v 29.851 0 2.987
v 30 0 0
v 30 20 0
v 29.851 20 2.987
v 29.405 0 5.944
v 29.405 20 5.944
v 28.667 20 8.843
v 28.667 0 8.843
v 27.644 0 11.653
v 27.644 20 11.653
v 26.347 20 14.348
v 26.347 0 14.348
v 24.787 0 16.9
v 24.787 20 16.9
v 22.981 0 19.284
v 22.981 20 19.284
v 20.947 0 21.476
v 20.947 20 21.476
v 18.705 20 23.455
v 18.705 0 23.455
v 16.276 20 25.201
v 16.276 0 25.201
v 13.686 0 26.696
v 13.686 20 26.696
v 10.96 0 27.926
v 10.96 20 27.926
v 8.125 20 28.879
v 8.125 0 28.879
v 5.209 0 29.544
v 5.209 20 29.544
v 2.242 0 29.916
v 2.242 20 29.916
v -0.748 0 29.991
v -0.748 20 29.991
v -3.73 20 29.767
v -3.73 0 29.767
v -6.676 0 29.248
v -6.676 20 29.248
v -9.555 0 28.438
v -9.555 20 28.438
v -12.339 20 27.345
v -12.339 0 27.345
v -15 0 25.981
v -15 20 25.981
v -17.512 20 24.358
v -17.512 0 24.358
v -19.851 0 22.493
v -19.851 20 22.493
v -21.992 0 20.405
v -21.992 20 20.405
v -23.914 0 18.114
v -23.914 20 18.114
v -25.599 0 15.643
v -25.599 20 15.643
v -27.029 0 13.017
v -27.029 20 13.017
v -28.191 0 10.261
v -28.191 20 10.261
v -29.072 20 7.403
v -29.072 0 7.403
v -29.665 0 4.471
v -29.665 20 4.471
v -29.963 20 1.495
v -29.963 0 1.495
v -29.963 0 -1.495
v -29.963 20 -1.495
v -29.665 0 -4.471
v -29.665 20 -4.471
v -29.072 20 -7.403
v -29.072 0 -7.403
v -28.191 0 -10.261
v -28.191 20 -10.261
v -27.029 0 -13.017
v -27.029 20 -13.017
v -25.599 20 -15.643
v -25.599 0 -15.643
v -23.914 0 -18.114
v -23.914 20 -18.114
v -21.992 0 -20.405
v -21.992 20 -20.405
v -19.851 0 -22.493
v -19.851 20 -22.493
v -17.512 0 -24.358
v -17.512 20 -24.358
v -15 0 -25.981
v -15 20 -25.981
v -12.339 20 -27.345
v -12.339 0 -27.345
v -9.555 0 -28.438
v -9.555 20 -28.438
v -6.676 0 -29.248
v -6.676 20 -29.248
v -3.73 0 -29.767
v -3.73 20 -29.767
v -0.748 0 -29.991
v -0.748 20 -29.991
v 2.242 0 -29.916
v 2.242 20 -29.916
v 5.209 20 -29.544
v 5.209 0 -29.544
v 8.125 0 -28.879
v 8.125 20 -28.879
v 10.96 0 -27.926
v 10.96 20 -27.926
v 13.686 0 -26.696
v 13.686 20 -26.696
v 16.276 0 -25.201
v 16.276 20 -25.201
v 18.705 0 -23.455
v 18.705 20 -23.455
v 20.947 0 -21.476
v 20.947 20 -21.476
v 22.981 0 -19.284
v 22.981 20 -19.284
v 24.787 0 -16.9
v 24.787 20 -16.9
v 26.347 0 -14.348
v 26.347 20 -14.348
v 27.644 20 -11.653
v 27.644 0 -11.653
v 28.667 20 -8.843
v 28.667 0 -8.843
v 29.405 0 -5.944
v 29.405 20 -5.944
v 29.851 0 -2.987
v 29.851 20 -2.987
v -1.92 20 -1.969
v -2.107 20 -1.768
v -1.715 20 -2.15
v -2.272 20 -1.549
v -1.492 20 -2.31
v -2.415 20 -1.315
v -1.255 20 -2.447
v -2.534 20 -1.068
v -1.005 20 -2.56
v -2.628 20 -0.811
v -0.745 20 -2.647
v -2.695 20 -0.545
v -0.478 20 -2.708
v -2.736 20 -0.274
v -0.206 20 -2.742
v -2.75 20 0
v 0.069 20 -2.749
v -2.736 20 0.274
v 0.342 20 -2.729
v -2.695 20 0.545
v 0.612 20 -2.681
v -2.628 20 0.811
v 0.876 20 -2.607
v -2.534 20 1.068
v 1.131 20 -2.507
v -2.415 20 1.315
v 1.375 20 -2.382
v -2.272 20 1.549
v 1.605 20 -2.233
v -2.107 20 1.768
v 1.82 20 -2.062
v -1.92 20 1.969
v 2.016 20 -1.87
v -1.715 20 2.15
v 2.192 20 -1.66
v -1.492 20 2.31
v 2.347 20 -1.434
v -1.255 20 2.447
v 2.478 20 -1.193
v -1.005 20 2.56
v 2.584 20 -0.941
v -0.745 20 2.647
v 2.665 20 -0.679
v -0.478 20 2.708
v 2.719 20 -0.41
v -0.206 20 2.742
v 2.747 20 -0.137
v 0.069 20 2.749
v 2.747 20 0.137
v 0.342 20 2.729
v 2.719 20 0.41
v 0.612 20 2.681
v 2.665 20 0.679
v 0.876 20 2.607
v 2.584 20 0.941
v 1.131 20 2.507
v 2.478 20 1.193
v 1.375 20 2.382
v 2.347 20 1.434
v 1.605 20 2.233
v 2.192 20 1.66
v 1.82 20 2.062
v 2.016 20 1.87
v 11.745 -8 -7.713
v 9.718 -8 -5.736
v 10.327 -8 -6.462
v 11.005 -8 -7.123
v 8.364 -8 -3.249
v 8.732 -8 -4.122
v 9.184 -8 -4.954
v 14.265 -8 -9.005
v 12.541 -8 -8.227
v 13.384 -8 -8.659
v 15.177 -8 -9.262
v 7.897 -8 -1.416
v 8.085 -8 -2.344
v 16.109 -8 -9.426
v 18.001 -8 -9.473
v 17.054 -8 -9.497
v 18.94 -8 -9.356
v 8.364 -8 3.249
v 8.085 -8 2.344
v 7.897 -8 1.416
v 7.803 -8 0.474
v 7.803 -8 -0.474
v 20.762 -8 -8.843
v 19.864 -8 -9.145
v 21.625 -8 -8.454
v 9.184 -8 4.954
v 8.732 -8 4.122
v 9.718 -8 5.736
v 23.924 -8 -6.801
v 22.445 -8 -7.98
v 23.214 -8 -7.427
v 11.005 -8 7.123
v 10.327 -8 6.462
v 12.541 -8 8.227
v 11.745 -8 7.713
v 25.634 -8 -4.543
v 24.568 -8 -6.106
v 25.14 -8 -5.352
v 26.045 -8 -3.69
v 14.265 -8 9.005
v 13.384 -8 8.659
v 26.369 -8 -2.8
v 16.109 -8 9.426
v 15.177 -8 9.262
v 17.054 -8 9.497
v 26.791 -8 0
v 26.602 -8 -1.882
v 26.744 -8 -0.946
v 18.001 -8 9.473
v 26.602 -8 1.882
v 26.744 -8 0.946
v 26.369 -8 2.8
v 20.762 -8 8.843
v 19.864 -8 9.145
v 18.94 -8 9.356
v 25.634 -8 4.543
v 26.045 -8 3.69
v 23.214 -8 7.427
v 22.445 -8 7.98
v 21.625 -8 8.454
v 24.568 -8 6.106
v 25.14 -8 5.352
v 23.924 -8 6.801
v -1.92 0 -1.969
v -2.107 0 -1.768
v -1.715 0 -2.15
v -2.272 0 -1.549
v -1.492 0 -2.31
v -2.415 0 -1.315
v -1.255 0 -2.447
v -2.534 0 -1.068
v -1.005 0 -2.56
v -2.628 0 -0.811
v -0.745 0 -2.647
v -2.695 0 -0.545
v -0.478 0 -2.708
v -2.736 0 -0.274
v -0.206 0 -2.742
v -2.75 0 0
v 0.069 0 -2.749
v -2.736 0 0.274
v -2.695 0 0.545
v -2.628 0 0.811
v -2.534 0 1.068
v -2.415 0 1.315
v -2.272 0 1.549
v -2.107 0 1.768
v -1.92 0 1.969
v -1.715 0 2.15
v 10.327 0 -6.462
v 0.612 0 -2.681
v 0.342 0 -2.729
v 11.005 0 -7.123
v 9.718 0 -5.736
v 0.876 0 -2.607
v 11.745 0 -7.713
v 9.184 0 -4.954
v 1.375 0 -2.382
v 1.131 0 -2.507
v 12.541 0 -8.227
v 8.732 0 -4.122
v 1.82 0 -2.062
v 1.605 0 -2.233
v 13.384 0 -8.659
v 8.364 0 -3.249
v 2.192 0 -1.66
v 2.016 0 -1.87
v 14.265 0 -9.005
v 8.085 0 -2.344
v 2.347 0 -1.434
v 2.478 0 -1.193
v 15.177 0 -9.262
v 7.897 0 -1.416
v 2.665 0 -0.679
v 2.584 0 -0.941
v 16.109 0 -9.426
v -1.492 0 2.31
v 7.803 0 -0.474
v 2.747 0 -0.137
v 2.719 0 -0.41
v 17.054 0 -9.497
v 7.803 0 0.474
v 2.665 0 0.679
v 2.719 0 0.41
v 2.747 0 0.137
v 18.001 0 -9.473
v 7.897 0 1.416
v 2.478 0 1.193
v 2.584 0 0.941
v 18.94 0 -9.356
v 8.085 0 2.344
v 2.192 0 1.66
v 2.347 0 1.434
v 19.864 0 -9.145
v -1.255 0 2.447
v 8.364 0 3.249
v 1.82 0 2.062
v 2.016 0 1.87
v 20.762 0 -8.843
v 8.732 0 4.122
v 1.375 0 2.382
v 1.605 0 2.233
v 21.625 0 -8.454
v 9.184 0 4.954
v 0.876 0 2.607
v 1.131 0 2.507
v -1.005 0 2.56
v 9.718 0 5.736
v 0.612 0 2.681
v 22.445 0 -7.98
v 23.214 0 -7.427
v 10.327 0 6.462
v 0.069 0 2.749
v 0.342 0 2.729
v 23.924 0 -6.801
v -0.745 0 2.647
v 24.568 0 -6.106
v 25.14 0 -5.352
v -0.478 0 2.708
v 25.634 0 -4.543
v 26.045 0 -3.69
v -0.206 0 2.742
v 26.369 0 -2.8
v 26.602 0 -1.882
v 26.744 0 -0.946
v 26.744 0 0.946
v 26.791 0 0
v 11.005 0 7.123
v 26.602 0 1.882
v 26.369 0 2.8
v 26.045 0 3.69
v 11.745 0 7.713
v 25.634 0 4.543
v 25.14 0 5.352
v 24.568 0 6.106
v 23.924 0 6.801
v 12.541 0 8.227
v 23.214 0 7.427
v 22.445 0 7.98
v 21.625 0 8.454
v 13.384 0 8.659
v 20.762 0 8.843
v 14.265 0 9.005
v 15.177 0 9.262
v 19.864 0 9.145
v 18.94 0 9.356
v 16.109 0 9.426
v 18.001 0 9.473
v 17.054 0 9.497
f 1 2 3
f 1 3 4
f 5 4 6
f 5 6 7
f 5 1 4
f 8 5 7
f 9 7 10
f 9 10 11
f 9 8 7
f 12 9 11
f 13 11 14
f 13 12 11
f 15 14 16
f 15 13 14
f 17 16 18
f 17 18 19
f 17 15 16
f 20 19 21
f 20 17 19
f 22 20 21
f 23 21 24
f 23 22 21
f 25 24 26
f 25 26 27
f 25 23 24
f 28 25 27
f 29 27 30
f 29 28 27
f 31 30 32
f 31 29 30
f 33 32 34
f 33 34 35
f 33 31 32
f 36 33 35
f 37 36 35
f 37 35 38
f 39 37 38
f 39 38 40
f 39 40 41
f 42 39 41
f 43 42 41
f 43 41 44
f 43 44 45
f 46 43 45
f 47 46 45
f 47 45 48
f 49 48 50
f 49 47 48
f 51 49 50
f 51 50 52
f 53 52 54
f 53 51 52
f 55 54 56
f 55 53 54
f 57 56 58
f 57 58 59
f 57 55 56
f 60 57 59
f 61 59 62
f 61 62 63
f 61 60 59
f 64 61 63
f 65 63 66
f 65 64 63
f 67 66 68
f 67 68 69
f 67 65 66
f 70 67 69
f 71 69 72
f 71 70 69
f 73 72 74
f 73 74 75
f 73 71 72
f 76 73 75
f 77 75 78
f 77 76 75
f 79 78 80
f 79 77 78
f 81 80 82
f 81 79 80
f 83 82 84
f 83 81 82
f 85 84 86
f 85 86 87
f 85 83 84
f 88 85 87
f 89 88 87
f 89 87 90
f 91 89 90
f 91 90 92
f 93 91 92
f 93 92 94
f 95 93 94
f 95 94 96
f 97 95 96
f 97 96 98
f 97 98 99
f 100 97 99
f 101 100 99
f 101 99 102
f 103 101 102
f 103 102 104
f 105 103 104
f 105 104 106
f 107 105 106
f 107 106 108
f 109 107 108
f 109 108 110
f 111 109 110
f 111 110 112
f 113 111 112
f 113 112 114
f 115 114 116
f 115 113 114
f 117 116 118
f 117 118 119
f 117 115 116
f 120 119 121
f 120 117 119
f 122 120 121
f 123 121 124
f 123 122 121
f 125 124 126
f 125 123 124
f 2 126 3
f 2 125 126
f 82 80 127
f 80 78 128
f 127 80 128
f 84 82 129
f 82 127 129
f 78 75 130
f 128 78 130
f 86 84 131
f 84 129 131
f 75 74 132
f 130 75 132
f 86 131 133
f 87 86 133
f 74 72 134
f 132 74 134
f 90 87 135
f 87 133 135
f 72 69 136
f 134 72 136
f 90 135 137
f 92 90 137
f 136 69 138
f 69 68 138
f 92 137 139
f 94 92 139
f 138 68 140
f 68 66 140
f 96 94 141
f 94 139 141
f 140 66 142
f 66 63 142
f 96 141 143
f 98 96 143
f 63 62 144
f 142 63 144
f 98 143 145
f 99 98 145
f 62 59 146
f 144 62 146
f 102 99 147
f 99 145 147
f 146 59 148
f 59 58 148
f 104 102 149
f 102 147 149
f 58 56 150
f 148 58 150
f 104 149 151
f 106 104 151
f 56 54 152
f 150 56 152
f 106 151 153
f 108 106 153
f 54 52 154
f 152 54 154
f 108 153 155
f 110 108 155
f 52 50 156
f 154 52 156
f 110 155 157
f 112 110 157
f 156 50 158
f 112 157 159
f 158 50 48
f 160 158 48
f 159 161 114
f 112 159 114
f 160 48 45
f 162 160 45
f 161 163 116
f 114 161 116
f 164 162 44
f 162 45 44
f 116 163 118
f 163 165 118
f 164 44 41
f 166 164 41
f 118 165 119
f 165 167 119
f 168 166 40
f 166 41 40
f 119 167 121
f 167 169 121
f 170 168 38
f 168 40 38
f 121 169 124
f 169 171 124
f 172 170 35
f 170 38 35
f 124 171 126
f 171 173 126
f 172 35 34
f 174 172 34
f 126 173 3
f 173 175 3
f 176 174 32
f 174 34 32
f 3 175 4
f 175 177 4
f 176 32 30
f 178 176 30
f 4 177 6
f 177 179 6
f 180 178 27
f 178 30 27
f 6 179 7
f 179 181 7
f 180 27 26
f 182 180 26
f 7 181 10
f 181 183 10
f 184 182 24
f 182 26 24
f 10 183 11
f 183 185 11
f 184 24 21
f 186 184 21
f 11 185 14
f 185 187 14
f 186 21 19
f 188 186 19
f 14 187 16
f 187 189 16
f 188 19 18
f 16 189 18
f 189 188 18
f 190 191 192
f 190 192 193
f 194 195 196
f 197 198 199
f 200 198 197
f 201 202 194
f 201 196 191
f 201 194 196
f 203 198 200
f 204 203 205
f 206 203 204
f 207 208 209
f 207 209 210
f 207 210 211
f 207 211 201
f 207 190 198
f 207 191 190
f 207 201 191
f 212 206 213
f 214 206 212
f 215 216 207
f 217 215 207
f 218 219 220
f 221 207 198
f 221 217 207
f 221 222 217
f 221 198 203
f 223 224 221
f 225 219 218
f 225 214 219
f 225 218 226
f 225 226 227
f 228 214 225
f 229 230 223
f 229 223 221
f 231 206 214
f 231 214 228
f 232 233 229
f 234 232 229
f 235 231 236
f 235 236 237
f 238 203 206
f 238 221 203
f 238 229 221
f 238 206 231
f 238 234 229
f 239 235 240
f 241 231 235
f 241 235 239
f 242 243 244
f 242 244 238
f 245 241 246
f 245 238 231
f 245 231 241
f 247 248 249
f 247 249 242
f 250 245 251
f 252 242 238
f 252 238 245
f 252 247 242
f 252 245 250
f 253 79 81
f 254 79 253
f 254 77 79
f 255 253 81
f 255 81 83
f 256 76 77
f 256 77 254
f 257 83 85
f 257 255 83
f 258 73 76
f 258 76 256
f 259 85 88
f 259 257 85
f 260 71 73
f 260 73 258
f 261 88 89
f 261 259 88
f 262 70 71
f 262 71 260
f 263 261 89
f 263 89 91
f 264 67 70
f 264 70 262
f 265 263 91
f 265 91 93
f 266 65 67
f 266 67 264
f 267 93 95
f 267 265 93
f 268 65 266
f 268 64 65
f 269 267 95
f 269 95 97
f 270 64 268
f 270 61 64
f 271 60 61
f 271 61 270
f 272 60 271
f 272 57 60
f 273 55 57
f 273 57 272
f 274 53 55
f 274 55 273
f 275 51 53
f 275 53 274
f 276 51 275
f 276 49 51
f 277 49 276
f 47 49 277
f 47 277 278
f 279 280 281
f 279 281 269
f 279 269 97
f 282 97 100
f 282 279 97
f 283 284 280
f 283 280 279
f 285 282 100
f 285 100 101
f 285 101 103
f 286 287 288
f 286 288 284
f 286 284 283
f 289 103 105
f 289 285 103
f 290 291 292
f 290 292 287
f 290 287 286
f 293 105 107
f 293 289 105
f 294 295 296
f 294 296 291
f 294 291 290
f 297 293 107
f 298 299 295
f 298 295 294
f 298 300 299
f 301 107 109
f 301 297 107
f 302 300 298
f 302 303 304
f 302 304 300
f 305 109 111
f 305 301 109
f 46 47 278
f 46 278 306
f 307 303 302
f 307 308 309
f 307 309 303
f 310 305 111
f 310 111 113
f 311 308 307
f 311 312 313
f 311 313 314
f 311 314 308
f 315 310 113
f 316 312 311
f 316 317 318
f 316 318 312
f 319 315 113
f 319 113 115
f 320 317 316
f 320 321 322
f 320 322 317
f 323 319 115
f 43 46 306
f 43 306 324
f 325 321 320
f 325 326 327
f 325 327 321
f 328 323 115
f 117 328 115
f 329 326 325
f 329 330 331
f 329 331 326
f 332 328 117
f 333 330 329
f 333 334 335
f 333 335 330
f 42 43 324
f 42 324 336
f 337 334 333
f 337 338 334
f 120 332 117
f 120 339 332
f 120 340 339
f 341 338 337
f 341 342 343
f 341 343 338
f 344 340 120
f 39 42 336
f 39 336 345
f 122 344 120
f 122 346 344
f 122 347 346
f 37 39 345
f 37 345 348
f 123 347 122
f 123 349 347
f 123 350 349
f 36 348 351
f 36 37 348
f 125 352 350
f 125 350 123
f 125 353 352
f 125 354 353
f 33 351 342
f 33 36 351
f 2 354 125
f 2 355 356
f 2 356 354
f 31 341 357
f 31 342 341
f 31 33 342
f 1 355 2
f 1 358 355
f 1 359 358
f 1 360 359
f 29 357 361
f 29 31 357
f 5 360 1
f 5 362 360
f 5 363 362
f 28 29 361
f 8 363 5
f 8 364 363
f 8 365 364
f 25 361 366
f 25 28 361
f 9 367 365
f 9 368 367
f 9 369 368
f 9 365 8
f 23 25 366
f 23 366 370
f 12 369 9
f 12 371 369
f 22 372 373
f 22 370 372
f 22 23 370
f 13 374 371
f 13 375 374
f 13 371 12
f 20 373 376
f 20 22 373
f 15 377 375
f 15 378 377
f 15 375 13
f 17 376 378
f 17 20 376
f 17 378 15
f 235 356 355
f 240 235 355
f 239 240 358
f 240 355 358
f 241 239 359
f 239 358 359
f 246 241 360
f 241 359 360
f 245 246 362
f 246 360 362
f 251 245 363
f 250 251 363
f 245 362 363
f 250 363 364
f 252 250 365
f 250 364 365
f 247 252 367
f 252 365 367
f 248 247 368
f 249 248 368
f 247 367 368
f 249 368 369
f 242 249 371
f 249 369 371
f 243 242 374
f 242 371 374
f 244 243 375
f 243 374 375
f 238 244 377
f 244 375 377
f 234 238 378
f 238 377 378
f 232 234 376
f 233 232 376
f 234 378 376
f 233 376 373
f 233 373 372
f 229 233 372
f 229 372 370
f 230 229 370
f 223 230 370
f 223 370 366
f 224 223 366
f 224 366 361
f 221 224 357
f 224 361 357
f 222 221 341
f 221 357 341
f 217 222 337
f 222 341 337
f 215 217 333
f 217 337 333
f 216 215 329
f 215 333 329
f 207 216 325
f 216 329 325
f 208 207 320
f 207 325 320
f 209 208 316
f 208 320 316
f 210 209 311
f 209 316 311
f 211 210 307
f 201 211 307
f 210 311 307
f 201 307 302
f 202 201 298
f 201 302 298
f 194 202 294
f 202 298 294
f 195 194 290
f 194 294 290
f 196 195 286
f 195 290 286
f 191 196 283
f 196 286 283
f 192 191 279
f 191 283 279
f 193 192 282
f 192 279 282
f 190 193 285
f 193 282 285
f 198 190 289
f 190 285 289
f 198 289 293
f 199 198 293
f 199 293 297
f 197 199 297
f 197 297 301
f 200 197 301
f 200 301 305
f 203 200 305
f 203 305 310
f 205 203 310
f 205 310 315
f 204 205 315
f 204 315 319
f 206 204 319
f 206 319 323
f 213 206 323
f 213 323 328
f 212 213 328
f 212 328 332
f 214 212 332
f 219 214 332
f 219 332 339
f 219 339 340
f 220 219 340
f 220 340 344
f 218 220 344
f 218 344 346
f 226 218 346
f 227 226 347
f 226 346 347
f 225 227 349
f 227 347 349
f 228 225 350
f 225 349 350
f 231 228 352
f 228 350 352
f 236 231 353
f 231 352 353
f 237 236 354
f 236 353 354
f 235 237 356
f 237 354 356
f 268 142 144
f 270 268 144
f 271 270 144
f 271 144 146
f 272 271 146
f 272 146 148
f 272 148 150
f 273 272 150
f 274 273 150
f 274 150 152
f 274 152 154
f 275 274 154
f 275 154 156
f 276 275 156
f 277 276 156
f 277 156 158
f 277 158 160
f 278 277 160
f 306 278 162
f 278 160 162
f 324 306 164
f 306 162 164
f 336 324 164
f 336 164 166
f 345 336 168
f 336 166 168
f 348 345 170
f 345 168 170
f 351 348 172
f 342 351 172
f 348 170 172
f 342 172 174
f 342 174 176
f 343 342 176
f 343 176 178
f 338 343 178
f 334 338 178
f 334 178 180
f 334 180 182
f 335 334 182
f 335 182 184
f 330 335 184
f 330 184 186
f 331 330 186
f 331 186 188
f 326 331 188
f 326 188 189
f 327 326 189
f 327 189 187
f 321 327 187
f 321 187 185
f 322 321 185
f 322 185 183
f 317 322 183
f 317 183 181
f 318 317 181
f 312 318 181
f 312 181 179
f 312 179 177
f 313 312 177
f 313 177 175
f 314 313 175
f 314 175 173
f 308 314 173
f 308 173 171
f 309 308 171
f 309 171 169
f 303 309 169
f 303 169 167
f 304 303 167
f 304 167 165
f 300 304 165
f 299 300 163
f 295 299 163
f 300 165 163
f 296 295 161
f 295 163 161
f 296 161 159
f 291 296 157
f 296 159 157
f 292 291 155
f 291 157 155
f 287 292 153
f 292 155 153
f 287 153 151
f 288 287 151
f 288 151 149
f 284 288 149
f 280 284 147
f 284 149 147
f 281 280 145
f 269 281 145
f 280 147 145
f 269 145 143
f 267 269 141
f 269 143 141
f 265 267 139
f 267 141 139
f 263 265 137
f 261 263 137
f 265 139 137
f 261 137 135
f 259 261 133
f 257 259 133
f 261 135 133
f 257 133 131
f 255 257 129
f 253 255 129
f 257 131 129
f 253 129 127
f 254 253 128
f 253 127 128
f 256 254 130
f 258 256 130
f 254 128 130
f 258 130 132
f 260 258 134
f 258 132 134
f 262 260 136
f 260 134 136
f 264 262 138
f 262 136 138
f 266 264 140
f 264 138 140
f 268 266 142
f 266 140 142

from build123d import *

# Parameters (mm, degrees)
F0_R     = 30
F0_R_2   = 9.5
F1_DEPTH = 20
F2_DEPTH = 8
F3_D     = 5.5


with BuildPart() as f1:
    # F0 (on Front) → F1 (new body)
    with BuildSketch(Plane.XZ):
        Circle(F0_R)
        with Locations((17.2907616943, 0)):
            Circle(F0_R_2, mode=Mode.SUBTRACT)
        with Locations((17.2907616943, 0)):
            Circle(F0_R_2)
    extrude(amount=-F1_DEPTH)

    # F0 (on Front) → F2 (join)
    with BuildSketch(Plane.XZ):
        with Locations((17.2907616943, 0)):
            Circle(F0_R_2)
    extrude(amount=F2_DEPTH)

    # F3 (through all)
    with Locations(Plane.XZ):
        with Locations((0, 0)):
            Hole(F3_D / 2)


solid = f1.part
